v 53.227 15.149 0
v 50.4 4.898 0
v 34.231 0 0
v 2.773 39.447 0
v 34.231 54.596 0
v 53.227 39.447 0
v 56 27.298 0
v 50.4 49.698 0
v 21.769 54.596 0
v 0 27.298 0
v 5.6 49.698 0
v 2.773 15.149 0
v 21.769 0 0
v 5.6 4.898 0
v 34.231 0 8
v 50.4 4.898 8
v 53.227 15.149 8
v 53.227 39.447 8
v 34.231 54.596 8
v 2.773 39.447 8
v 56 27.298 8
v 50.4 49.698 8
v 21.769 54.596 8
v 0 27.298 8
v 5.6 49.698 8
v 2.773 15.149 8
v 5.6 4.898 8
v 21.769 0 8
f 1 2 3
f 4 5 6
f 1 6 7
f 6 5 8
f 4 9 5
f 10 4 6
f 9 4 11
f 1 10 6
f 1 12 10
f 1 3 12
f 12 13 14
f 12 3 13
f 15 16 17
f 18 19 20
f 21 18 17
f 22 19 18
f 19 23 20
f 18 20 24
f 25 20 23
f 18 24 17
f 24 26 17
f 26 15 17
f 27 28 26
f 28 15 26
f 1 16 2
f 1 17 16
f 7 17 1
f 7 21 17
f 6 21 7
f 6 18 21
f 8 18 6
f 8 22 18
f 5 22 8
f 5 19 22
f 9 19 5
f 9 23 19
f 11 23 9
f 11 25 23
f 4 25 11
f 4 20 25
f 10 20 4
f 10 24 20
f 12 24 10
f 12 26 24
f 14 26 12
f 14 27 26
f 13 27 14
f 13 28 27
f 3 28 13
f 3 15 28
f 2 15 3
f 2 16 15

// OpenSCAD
$fn = 32;

// ----------------------------------------------------------------------
// Flat adaptor: hex_disc, 8 mm thick
// ----------------------------------------------------------------------

// --- parameters (mm) ---
profile_height = 8;       // extrusion height
profile_points = 14;      // points of the closed outline

profile = [[0, 27.298], [2.773, 15.149], [5.6, 4.898], [21.769, 0], [34.231, 0], [50.4, 4.898], [53.227, 15.149], [56, 27.298], [53.227, 39.447], [50.4, 49.698], [34.231, 54.596], [21.769, 54.596], [5.6, 49.698], [2.773, 39.447]];  // single closed polygon, 14 points, counter clockwise

// --- the one profile operation ---
linear_extrude(height = profile_height) polygon(points = profile);
